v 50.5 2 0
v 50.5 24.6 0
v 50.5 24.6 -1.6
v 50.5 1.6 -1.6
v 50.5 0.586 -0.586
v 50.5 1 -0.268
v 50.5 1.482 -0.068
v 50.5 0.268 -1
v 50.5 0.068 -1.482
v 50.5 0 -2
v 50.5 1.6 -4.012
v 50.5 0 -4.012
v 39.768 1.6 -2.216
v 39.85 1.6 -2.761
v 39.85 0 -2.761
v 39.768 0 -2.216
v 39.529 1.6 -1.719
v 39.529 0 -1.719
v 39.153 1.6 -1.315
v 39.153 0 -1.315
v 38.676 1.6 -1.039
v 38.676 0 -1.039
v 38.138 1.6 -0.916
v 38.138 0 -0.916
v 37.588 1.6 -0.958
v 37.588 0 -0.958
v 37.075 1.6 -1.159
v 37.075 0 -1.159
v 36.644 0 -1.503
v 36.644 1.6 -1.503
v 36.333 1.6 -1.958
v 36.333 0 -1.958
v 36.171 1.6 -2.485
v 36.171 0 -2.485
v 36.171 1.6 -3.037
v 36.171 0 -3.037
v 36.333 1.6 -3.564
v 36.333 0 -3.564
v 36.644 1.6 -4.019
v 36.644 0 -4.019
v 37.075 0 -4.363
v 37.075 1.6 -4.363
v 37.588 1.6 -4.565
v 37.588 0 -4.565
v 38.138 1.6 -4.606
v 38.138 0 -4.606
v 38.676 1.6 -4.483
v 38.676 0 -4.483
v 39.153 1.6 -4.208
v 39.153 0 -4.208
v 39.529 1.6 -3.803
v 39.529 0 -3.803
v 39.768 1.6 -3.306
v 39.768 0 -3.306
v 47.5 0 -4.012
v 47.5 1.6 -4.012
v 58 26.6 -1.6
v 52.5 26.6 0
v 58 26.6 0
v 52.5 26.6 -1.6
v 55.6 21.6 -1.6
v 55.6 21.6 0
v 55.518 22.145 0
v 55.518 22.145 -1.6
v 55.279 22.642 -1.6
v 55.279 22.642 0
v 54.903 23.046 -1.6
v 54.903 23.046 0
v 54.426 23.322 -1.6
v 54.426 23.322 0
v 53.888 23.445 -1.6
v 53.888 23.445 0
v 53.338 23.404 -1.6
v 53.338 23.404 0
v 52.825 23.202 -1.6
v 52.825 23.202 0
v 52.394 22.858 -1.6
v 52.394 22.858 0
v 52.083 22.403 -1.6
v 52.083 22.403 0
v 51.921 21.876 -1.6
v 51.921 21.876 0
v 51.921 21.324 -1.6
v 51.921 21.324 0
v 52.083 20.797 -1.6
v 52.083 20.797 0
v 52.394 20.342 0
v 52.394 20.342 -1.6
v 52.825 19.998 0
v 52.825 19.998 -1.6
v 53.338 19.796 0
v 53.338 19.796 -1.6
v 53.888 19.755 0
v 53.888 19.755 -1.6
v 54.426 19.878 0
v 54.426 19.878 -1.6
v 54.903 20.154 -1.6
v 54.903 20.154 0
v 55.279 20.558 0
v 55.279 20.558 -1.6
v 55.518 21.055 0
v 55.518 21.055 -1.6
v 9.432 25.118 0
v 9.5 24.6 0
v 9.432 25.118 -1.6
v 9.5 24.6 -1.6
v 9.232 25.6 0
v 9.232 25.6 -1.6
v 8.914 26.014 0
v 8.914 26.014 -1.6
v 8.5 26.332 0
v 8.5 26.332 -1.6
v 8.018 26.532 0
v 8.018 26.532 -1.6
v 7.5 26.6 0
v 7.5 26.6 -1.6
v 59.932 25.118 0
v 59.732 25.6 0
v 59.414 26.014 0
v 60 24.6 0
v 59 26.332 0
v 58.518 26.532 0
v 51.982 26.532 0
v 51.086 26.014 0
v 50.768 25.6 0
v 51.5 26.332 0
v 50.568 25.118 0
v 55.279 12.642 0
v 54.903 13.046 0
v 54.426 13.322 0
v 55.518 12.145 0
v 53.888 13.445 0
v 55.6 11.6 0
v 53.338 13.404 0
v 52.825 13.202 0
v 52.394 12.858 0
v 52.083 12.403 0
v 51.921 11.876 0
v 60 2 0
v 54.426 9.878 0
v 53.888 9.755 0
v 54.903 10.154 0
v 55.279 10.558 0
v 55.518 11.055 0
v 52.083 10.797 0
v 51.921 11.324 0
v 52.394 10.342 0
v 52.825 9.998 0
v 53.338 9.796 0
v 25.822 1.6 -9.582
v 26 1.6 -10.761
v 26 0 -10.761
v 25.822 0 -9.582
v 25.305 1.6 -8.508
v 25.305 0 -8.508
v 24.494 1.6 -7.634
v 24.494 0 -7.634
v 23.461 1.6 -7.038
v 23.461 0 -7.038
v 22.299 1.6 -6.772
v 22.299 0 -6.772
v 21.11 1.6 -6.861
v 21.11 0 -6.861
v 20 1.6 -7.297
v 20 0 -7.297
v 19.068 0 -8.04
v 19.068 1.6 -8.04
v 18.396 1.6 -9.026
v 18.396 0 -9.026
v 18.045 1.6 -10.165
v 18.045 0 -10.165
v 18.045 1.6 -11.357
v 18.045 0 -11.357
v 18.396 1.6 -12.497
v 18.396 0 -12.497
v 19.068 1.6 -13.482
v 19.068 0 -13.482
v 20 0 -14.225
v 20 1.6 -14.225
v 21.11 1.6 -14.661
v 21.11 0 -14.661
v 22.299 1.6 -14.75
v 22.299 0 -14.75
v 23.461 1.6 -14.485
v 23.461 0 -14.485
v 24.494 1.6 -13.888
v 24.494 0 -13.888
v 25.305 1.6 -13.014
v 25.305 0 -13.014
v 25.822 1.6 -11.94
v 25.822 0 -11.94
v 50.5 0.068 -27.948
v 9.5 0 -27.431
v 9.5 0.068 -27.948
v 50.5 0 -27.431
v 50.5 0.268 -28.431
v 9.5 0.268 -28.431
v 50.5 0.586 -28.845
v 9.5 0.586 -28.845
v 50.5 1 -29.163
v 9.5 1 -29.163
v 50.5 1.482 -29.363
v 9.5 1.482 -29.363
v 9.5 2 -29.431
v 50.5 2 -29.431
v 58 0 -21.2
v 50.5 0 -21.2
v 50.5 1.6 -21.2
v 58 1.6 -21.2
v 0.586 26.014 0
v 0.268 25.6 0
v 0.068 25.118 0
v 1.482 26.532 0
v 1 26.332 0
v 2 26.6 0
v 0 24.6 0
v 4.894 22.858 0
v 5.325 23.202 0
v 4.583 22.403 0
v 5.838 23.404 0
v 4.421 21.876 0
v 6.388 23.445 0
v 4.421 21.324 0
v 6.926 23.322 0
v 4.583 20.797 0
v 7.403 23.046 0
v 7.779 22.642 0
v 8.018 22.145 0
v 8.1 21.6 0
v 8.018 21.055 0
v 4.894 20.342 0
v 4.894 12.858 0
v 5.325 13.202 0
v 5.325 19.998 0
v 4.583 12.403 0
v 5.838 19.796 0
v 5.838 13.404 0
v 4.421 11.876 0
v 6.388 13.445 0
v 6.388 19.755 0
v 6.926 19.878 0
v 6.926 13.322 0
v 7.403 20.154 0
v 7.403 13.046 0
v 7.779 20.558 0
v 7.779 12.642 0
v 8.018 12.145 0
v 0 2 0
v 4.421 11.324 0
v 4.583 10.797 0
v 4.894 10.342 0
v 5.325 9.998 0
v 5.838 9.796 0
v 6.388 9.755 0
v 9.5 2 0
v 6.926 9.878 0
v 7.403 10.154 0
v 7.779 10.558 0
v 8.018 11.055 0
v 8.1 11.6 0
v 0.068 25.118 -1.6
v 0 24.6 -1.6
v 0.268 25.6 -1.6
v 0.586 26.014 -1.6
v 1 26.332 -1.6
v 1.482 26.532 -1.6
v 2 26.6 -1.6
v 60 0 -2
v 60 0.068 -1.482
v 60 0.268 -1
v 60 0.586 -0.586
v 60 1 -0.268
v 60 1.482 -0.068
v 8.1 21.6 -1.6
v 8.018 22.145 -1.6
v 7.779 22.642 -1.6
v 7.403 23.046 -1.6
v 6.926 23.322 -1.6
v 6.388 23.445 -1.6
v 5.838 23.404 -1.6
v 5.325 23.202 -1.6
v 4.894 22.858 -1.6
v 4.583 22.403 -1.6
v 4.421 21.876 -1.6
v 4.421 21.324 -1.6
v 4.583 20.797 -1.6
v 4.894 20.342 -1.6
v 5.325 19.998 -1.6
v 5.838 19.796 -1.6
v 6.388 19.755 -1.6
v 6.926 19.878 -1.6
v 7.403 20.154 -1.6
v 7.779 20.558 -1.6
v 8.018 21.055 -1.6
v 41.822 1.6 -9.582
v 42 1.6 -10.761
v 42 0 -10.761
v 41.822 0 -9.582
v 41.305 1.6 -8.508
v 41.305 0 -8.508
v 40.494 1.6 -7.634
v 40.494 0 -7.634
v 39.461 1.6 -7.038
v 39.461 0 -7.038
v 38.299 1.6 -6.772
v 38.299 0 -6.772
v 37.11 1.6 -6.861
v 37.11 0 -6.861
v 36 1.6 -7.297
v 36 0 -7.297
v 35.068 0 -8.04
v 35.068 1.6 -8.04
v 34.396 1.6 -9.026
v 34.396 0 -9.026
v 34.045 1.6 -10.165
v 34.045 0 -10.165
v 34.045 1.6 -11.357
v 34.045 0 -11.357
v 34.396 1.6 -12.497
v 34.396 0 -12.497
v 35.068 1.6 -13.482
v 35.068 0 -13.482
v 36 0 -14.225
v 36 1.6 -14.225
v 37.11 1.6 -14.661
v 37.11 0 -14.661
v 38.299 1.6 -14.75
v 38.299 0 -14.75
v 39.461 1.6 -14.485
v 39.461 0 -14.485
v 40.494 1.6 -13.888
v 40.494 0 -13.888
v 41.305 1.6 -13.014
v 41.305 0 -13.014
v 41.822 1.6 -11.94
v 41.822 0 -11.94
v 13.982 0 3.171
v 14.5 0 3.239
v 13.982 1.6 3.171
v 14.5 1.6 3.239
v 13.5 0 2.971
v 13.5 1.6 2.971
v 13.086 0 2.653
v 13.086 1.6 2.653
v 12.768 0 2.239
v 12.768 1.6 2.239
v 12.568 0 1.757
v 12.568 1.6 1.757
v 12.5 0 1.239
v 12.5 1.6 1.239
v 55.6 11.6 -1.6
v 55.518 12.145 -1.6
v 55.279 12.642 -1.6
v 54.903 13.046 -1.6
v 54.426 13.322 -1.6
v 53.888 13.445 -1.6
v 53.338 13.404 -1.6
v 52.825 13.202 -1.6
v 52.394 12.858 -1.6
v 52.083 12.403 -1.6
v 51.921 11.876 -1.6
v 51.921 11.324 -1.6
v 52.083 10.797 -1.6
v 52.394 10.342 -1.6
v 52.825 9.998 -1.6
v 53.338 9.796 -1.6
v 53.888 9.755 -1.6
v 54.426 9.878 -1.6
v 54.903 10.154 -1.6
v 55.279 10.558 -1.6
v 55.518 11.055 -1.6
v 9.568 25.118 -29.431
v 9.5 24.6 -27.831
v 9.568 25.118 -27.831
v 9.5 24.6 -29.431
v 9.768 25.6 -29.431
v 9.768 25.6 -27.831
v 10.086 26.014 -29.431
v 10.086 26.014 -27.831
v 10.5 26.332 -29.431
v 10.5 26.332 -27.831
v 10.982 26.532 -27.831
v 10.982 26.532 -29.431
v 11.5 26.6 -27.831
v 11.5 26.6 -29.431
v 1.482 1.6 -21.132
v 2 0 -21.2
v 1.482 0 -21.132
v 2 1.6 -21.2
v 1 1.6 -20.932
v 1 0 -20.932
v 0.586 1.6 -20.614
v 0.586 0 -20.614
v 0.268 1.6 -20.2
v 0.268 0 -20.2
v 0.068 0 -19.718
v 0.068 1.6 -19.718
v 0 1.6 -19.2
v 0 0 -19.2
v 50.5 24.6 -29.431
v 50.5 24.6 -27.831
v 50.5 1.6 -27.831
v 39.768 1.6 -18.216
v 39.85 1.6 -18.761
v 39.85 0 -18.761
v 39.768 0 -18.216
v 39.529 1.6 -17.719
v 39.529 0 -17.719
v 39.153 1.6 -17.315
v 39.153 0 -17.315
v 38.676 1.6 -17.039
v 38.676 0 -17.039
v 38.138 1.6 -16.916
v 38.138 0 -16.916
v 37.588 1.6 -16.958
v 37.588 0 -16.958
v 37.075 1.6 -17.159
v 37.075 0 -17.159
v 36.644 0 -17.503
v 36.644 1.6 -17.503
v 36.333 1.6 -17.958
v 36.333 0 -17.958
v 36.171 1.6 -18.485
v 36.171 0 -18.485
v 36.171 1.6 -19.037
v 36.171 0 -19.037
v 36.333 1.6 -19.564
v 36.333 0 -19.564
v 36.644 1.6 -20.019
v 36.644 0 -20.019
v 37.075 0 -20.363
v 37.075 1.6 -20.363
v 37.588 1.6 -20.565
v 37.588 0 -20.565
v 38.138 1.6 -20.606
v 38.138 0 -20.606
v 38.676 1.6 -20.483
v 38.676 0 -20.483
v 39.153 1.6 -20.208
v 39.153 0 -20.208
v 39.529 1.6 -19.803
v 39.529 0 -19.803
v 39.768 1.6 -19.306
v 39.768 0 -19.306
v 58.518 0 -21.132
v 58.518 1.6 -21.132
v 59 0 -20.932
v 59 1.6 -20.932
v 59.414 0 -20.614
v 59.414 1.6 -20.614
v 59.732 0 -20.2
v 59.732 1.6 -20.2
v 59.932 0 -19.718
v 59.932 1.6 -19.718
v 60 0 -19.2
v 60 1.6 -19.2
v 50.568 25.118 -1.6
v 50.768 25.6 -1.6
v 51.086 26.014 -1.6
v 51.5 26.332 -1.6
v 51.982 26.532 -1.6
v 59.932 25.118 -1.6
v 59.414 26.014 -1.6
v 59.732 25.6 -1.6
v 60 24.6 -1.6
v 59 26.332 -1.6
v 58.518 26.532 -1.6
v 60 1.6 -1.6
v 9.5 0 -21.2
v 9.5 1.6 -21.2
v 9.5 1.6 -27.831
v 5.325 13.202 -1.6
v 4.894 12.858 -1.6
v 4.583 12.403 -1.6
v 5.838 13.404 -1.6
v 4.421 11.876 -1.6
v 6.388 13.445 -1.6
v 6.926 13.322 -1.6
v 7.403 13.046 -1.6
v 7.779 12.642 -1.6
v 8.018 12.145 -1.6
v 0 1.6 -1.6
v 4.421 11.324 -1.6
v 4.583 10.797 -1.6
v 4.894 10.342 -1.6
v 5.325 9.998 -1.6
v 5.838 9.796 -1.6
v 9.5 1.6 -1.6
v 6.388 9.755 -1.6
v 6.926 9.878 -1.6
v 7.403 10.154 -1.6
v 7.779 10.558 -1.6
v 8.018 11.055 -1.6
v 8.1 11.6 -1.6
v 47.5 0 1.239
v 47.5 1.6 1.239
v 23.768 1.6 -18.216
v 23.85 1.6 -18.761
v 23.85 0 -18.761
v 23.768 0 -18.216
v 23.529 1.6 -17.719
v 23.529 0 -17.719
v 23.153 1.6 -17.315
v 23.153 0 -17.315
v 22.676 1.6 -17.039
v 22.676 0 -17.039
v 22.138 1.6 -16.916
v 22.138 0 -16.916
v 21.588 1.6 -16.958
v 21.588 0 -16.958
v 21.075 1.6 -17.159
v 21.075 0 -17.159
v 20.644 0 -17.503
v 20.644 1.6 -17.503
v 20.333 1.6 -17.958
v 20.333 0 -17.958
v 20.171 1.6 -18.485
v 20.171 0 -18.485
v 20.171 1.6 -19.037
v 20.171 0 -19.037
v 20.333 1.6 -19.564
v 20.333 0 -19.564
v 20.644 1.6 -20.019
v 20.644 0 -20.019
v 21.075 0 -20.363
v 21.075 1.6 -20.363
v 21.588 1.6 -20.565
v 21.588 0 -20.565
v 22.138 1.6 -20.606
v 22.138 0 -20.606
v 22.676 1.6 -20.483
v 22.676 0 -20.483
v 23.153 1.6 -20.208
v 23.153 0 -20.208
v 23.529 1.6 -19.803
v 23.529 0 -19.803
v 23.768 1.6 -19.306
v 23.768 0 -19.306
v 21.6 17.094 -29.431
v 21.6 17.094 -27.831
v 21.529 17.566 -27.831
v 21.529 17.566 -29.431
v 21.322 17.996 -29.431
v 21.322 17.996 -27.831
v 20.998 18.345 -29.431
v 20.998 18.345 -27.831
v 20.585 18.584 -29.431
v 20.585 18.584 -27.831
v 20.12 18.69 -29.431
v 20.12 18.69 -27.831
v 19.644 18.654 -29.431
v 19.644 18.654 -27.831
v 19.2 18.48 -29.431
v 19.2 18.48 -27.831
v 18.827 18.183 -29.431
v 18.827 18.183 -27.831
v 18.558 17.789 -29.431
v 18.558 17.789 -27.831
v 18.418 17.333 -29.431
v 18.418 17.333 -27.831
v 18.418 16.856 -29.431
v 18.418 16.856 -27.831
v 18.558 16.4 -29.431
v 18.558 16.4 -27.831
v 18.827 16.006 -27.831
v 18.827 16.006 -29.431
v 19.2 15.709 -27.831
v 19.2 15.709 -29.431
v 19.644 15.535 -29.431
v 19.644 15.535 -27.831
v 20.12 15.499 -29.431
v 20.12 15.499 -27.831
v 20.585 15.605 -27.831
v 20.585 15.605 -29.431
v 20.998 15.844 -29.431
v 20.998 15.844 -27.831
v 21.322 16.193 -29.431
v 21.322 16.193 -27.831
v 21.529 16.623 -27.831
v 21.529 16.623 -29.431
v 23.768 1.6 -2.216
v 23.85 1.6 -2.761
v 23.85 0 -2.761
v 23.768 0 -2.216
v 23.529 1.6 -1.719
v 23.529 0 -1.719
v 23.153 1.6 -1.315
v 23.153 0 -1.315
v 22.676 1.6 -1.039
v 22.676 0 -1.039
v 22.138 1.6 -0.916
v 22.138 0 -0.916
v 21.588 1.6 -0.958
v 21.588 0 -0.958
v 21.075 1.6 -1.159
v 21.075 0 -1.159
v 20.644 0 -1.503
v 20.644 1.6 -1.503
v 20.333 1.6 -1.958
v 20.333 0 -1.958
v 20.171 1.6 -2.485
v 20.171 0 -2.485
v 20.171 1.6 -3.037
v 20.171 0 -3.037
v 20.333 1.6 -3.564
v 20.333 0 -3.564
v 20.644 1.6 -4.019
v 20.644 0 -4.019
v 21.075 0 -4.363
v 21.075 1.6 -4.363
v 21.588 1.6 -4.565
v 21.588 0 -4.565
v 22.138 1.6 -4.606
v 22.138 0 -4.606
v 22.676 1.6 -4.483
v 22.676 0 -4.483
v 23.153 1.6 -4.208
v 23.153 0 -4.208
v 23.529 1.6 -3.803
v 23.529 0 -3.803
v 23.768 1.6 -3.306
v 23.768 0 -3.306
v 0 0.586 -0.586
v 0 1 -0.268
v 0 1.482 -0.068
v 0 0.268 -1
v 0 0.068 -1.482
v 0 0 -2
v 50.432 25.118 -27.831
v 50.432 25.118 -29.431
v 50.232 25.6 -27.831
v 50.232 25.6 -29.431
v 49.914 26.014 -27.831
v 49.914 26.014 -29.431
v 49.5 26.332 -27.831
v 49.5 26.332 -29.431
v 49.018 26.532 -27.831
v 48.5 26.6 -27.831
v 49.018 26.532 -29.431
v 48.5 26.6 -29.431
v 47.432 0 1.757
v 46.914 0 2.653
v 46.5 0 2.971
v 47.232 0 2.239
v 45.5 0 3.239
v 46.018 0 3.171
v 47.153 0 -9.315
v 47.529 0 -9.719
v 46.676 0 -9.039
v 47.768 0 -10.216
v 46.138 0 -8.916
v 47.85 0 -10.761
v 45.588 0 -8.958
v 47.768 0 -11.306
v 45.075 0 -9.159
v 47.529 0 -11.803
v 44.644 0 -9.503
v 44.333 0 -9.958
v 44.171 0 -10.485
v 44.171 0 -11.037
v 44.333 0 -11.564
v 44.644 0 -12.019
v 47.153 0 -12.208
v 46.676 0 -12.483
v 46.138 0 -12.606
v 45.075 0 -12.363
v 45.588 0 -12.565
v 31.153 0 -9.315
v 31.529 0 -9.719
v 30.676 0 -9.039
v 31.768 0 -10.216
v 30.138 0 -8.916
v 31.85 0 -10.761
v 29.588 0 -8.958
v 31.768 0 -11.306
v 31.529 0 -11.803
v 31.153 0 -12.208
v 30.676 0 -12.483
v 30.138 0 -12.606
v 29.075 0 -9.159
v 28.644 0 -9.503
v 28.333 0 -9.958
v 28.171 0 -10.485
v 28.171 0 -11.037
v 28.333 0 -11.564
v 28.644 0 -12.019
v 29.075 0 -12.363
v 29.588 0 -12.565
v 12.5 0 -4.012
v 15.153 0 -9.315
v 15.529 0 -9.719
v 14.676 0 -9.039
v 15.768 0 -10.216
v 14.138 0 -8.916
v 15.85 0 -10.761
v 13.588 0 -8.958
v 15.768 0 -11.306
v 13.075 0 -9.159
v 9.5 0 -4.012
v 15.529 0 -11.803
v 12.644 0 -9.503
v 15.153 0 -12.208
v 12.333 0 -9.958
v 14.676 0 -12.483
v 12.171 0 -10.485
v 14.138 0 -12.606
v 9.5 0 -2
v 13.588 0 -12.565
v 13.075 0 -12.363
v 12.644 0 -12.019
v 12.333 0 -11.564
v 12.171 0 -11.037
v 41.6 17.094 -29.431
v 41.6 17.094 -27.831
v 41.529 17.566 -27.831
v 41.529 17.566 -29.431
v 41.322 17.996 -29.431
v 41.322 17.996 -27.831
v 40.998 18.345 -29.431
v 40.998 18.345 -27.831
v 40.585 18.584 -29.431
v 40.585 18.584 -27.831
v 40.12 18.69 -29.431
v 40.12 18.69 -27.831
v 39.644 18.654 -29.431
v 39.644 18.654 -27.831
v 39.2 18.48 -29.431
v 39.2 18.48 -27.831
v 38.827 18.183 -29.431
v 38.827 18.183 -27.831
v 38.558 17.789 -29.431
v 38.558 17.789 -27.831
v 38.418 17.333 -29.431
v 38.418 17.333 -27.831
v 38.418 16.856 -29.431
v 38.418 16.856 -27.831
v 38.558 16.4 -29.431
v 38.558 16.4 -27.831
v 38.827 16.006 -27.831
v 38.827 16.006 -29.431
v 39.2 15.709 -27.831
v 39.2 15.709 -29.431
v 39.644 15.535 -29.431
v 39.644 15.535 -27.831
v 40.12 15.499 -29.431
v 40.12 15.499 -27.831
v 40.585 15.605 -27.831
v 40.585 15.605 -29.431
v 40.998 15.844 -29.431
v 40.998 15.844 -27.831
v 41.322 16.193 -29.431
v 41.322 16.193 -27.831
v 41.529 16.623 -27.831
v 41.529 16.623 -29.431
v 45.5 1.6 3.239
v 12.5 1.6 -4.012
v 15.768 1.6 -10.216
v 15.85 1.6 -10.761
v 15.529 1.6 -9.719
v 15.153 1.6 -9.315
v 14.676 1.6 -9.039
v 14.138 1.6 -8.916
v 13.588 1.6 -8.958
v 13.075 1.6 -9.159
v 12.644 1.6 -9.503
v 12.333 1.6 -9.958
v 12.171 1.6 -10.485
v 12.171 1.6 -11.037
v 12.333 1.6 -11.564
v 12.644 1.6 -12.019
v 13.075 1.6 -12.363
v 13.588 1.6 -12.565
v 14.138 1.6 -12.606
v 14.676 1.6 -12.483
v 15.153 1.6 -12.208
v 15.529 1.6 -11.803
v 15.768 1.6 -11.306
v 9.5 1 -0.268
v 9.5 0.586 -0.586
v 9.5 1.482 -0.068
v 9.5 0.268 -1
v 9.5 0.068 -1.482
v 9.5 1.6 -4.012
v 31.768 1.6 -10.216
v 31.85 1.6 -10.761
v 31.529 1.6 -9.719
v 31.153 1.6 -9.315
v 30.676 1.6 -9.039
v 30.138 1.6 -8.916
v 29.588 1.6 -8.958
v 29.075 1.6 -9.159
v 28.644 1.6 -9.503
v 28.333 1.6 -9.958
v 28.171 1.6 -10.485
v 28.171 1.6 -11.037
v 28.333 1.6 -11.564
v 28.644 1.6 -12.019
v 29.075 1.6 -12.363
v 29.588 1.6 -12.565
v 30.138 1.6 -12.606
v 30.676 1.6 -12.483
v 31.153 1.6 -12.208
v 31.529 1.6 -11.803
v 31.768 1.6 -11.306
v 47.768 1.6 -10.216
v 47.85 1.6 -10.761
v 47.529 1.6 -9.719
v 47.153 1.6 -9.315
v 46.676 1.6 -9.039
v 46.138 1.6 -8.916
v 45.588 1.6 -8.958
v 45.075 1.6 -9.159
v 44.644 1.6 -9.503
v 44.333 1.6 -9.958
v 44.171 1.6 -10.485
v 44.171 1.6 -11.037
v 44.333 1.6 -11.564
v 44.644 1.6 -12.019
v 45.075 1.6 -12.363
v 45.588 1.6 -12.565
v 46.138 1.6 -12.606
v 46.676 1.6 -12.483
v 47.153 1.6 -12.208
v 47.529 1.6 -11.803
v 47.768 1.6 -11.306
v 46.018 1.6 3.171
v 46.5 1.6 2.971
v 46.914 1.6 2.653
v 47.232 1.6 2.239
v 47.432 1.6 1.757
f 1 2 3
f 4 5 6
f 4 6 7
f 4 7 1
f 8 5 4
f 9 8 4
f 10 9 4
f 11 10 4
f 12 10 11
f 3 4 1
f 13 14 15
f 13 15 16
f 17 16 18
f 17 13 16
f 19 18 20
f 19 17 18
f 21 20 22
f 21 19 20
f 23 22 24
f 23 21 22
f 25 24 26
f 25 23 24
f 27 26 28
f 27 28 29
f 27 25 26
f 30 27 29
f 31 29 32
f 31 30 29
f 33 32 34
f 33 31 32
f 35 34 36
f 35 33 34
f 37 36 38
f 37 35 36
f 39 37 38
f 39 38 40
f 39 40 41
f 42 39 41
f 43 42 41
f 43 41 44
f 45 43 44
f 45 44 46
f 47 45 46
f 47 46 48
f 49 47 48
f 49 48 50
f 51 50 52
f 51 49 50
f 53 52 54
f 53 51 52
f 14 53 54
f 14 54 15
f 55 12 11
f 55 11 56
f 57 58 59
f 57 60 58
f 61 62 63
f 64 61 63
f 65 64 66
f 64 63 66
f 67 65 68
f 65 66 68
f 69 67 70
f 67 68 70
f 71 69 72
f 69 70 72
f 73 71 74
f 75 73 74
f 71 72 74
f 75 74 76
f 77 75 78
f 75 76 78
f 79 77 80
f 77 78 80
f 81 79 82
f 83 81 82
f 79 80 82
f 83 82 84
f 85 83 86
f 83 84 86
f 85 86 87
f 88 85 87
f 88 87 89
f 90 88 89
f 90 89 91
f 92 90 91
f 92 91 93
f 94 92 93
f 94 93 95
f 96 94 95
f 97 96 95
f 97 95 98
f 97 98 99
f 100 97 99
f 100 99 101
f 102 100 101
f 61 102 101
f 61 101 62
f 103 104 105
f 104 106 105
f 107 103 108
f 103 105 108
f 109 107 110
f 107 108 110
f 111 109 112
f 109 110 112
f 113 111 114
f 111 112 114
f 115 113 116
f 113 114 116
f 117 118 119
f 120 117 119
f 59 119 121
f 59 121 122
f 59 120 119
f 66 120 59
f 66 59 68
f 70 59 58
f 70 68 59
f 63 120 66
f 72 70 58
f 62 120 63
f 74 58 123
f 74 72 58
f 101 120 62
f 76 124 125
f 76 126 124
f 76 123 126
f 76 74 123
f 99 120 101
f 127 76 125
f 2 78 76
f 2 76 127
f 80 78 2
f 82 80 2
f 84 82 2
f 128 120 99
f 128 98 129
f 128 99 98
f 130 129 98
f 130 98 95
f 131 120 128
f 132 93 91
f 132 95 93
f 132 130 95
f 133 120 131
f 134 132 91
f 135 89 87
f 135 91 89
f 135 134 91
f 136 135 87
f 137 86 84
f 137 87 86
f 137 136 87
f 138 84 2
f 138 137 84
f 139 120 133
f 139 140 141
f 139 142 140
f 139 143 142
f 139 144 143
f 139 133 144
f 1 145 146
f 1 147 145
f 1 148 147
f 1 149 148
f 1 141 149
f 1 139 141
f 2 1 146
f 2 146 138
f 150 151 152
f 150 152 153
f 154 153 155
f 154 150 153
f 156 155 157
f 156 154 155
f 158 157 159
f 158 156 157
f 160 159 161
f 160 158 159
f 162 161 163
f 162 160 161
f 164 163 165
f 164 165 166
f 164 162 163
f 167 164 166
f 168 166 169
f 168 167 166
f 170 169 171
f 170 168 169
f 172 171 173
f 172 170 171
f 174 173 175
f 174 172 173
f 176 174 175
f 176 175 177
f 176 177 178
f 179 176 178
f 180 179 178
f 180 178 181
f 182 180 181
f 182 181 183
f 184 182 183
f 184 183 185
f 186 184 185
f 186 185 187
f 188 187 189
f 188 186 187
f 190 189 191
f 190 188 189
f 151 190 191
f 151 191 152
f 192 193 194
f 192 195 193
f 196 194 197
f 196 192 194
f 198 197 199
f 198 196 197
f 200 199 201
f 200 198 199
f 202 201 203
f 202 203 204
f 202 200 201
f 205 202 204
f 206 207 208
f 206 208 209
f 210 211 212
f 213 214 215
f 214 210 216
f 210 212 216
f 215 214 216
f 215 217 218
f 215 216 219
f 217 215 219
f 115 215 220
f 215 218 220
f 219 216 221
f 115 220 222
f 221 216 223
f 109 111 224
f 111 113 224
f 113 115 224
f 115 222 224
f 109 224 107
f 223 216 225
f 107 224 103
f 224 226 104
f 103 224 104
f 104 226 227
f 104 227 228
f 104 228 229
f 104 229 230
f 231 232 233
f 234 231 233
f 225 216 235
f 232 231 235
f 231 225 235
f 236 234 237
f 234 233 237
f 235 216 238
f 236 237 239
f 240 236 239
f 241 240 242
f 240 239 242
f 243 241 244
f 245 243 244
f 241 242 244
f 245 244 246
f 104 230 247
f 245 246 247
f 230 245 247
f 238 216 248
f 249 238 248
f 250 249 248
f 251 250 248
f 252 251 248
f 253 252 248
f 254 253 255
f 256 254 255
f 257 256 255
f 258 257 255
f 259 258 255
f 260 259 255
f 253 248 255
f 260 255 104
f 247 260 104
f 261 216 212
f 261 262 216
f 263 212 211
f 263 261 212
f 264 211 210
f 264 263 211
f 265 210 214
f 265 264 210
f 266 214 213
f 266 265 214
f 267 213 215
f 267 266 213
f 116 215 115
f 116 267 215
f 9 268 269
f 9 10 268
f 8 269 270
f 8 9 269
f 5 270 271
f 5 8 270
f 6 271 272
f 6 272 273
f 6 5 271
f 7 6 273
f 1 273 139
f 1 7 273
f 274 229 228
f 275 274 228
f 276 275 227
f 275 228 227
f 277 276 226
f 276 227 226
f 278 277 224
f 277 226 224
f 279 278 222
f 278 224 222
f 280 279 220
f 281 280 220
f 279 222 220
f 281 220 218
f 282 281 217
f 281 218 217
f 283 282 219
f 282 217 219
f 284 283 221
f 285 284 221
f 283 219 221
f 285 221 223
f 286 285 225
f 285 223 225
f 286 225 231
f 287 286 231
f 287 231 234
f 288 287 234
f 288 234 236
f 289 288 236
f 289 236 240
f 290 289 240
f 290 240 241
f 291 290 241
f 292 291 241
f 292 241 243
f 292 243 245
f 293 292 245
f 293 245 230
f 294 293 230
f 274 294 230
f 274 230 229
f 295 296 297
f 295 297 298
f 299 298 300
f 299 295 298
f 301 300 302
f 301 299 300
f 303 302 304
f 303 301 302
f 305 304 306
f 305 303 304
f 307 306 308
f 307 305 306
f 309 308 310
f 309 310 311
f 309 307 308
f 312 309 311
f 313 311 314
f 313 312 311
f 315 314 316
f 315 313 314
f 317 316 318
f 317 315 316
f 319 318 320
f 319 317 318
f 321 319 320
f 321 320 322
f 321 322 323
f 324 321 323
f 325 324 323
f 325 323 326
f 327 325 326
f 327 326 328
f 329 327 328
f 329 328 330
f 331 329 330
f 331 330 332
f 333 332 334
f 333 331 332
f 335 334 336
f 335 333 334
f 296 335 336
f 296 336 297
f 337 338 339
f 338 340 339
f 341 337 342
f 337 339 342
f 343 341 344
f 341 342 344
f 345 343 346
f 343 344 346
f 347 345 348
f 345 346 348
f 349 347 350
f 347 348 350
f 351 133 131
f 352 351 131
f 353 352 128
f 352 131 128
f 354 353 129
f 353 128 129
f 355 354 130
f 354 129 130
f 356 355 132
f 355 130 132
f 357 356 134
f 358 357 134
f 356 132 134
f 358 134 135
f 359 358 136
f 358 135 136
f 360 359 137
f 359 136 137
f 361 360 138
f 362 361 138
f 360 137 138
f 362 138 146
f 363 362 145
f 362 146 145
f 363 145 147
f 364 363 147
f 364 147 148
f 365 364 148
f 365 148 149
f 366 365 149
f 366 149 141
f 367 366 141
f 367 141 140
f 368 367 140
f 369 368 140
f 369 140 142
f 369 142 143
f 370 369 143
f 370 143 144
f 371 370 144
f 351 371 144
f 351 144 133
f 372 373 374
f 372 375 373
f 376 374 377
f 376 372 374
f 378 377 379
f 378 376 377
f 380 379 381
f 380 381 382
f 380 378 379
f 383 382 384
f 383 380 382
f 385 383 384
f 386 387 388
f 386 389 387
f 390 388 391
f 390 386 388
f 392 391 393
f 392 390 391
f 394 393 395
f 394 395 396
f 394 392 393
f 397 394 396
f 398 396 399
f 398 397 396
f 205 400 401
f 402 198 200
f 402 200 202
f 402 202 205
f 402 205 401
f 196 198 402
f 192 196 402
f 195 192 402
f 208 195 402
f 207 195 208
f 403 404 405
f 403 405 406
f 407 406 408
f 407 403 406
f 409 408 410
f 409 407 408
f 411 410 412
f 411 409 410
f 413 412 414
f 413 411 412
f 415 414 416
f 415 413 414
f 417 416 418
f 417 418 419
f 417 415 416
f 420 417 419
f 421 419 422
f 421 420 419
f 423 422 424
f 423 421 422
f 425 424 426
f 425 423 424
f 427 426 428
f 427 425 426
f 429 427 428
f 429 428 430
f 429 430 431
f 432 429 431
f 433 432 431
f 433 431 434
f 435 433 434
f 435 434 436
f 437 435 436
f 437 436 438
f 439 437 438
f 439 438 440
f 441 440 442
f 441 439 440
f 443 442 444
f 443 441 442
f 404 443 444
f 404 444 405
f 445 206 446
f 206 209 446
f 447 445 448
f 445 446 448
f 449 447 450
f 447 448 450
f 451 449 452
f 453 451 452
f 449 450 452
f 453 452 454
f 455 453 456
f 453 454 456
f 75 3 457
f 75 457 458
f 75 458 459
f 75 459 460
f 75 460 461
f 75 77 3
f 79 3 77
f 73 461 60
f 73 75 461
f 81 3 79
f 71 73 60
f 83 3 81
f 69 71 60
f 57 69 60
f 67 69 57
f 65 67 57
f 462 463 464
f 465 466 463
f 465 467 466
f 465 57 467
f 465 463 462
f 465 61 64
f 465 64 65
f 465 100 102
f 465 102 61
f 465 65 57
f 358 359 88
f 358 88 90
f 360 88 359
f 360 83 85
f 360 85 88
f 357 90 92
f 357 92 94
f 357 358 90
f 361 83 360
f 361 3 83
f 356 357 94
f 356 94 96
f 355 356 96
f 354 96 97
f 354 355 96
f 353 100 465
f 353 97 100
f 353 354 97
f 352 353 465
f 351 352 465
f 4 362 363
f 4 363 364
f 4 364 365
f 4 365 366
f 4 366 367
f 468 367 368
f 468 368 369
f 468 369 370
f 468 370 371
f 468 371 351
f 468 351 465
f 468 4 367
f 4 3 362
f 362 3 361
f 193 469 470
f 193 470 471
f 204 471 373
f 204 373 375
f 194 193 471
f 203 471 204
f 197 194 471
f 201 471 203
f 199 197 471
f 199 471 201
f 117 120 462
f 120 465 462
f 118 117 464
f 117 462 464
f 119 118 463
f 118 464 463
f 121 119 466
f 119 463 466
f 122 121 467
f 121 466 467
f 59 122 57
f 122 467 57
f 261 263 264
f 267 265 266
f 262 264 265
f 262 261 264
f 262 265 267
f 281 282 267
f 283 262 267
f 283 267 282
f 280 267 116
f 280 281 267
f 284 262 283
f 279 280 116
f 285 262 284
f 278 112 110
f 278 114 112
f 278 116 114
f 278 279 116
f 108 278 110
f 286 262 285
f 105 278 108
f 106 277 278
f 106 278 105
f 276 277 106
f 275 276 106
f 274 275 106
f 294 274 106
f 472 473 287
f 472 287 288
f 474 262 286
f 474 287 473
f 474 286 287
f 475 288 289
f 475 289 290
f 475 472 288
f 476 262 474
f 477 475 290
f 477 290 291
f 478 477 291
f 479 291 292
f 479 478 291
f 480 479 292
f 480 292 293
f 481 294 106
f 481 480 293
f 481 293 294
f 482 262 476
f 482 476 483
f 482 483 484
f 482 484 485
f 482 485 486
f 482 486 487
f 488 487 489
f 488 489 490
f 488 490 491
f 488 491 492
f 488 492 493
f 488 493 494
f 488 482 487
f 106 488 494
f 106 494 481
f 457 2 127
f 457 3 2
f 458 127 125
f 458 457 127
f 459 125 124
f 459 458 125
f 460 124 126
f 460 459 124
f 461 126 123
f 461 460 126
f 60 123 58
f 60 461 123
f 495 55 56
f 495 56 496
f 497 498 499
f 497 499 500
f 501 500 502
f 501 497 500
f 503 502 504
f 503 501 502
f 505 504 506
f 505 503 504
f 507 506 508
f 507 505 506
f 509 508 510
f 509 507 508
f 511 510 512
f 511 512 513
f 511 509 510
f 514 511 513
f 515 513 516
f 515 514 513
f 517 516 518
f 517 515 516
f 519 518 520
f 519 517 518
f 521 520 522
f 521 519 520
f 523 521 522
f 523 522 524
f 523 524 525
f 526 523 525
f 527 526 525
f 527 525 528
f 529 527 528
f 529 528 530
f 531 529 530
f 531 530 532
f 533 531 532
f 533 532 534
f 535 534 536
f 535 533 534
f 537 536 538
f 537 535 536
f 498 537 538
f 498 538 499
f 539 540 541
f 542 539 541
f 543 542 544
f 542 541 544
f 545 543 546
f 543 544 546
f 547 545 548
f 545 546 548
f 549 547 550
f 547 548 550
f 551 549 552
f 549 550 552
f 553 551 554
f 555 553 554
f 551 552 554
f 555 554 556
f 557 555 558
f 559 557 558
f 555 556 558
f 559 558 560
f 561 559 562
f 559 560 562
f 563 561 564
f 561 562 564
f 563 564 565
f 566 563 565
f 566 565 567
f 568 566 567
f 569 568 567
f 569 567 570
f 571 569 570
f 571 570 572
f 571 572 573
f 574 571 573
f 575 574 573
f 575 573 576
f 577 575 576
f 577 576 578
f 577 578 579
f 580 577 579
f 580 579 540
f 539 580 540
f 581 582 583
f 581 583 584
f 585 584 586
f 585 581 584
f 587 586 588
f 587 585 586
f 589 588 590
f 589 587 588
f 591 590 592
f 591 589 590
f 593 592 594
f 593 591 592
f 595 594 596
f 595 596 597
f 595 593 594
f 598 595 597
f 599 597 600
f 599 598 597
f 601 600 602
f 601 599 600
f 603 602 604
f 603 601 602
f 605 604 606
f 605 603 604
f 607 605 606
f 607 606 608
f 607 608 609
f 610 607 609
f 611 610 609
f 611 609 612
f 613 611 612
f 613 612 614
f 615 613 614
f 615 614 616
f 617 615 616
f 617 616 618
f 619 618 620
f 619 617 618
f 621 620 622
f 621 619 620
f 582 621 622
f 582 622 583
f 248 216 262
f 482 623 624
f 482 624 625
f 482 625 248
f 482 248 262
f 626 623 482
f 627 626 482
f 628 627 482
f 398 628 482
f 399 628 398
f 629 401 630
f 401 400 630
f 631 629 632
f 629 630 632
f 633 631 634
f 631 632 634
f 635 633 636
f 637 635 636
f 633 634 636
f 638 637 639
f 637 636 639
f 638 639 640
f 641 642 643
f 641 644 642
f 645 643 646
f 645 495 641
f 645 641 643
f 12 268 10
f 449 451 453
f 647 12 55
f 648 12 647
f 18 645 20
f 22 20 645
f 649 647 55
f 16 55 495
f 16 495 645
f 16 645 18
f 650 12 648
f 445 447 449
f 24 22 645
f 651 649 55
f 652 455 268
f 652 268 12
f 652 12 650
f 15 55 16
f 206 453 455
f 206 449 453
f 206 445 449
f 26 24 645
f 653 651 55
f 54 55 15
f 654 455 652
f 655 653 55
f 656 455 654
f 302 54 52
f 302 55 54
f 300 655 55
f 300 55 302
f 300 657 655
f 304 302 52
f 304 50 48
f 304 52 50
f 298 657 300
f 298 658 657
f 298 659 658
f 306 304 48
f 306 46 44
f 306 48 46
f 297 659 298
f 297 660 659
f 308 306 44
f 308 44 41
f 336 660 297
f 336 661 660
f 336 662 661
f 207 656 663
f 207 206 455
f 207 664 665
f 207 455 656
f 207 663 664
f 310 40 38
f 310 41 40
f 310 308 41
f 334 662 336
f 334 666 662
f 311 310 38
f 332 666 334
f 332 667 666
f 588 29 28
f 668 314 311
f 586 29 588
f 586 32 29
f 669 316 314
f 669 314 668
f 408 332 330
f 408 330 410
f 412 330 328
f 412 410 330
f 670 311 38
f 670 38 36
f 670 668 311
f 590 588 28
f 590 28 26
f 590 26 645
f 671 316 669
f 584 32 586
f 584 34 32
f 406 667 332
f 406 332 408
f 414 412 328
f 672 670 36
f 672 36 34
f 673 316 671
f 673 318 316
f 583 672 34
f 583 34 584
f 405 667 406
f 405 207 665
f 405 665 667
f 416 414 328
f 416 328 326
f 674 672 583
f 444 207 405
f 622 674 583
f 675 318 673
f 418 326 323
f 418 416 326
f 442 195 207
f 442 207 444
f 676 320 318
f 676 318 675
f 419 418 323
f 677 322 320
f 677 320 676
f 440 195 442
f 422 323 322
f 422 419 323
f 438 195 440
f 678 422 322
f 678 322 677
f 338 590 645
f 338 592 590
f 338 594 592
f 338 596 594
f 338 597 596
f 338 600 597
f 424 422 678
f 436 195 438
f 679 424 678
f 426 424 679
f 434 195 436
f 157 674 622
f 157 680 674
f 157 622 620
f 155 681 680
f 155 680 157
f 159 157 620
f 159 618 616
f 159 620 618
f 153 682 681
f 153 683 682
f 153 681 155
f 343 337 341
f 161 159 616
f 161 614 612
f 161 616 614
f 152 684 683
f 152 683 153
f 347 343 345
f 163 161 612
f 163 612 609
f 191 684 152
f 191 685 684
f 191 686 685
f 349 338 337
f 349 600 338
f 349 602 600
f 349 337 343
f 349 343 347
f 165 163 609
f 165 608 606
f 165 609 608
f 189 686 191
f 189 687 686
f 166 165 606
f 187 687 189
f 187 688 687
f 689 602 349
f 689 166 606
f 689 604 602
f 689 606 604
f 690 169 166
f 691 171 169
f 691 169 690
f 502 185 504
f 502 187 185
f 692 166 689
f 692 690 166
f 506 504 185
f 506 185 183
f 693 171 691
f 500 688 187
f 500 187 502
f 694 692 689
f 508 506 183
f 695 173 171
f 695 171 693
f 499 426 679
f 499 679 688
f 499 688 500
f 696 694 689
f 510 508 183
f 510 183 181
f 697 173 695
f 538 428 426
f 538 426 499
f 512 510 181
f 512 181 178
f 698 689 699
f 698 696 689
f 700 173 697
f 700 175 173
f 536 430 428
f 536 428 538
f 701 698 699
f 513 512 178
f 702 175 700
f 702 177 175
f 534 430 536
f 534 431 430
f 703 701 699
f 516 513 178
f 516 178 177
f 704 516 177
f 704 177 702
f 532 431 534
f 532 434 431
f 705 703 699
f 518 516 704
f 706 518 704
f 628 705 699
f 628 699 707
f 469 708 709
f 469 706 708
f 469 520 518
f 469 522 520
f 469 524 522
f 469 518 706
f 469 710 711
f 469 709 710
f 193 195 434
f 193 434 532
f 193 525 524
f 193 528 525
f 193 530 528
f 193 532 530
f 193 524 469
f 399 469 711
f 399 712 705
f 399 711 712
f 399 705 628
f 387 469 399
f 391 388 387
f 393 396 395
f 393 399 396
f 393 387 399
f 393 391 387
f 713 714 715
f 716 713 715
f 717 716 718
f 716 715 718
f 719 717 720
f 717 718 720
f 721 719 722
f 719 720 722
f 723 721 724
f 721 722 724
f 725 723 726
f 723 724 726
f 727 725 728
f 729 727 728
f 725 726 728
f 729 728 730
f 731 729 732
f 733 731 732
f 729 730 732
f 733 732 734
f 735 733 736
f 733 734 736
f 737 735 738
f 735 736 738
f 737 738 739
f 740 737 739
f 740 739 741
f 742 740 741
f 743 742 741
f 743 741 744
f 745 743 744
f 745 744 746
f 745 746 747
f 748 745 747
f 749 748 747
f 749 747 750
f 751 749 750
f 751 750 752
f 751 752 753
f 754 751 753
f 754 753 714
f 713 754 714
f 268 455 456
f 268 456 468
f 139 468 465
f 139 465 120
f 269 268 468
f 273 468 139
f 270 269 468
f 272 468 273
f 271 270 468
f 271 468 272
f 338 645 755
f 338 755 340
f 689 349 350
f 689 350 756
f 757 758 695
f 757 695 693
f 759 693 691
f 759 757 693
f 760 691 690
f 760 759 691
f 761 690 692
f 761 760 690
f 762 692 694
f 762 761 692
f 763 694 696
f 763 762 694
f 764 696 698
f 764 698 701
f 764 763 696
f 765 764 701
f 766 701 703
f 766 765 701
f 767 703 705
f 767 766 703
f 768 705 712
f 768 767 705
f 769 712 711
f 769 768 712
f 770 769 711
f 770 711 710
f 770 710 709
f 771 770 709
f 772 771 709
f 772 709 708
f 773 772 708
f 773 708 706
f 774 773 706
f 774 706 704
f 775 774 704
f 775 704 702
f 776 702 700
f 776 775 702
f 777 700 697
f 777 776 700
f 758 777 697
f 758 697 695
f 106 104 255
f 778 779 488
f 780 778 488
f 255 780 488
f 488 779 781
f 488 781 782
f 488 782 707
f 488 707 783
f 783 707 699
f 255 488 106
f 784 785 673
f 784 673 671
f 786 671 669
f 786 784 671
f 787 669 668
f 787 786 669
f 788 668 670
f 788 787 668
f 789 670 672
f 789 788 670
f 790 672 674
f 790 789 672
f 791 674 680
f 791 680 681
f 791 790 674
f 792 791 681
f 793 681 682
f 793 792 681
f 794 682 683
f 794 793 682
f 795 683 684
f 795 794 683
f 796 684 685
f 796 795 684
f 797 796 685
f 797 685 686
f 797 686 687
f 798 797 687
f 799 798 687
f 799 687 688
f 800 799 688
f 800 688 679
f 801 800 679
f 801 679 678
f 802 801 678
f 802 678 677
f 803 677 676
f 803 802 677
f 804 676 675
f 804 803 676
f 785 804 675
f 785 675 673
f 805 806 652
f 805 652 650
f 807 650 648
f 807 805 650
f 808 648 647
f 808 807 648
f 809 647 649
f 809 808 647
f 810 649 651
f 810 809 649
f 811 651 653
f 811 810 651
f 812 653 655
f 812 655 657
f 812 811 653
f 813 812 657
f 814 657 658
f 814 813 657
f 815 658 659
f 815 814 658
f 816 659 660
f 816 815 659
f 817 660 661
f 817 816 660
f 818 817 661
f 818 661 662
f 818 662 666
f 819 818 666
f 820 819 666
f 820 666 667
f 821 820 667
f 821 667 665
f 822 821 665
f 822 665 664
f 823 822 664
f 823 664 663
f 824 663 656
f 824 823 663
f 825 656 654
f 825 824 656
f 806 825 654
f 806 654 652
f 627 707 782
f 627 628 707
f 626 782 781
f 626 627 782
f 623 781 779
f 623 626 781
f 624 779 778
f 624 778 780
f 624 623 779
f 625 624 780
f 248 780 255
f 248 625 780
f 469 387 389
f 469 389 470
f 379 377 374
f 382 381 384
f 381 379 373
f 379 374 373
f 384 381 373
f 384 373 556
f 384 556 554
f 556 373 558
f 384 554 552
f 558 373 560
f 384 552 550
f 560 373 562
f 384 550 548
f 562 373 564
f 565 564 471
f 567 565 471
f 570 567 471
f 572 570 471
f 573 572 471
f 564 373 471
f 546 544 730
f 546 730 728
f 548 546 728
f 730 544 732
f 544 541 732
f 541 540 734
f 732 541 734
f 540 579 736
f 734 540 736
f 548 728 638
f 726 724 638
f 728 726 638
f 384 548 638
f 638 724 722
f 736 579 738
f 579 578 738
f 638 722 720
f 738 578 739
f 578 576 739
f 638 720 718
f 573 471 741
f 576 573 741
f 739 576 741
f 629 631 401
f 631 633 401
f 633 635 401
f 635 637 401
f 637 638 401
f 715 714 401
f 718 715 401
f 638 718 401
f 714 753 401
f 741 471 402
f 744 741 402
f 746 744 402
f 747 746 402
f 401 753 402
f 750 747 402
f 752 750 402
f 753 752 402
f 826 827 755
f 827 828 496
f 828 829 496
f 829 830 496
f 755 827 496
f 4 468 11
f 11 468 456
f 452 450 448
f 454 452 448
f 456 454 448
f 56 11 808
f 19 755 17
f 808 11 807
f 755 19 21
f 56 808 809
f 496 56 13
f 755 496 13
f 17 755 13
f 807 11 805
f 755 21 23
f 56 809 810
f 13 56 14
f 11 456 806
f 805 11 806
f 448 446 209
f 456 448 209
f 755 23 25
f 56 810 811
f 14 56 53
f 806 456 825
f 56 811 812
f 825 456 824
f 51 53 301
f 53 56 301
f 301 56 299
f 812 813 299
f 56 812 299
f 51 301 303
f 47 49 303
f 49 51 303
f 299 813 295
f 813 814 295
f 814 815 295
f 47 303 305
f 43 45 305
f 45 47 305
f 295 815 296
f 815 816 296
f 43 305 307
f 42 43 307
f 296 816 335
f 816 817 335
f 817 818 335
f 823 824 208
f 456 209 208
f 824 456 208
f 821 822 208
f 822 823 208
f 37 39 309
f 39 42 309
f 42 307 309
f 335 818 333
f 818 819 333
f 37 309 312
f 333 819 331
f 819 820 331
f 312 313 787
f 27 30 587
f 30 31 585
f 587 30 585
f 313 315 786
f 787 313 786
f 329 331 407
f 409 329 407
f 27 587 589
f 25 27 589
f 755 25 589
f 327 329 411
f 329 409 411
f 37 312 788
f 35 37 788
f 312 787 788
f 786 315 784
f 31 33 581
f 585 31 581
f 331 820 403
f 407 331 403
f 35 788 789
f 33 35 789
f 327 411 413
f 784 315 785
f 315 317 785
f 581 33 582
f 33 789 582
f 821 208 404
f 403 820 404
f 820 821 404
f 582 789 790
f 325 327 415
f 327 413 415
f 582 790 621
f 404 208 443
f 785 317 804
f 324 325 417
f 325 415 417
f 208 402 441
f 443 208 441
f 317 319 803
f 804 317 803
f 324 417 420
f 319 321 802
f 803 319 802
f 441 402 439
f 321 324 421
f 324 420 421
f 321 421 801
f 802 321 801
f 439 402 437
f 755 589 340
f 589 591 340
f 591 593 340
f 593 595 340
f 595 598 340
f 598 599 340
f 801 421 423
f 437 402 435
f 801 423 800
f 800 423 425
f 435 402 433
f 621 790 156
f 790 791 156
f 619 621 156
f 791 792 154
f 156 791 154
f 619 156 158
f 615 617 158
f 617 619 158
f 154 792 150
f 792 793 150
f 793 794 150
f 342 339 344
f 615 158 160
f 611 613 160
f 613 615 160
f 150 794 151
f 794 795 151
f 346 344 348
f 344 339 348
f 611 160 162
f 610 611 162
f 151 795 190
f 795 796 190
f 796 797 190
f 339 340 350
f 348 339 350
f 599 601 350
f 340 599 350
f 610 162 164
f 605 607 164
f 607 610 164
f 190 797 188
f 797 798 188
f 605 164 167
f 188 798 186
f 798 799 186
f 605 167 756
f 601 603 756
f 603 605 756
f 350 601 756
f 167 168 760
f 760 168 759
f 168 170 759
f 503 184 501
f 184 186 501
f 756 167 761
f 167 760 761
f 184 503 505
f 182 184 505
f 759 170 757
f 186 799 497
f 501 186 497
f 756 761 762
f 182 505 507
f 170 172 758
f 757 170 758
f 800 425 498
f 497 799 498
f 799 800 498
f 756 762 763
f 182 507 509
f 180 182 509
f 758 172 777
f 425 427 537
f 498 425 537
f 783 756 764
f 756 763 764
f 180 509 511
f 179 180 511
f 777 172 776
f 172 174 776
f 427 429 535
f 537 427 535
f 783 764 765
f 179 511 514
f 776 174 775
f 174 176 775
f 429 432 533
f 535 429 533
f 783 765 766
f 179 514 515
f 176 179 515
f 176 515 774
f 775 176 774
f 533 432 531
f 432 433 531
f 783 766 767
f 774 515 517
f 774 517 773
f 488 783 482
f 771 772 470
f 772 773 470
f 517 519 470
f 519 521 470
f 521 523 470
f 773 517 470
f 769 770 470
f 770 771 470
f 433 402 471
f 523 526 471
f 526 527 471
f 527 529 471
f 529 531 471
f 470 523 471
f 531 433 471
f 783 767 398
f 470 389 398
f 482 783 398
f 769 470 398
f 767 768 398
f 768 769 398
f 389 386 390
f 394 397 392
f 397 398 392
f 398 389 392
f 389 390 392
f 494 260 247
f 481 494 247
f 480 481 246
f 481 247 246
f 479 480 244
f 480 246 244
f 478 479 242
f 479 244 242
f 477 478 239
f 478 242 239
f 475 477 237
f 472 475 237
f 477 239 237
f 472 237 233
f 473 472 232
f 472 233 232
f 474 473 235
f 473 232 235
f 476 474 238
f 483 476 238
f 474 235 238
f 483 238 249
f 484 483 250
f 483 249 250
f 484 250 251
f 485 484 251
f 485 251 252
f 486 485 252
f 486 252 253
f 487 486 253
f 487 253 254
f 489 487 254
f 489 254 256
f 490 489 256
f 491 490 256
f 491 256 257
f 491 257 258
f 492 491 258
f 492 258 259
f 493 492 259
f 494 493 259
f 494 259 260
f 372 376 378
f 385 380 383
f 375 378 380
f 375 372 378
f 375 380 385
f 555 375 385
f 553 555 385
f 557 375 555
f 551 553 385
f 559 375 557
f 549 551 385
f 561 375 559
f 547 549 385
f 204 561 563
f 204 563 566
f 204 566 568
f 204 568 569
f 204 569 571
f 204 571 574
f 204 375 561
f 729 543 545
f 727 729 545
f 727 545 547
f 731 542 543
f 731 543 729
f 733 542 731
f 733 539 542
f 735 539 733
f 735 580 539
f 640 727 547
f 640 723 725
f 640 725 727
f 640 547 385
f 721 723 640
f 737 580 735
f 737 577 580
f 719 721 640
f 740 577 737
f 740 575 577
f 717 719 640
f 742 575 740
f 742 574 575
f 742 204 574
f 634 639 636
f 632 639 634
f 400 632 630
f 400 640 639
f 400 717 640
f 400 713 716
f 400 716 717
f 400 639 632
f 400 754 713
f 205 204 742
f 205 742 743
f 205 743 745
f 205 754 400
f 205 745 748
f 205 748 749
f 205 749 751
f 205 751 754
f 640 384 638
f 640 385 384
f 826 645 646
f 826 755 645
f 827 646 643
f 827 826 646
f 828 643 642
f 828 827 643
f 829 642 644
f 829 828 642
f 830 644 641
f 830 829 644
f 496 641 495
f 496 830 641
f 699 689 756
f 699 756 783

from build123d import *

# Parameters (mm, degrees)
EXTRUDE1_DEPTH           = 1.6
SKETCH2_W                = 9.5
SKETCH2_H                = 1.6
SKETCH2_W_2              = 41
EXTRUDE2_DEPTH           = 25
SKETCH3_R                = 1.85
CUT_EXTRUDE1_DEPTH       = 72.928615584
SKETCH4_R                = 1.6
CUT_EXTRUDE2_DEPTH       = 25
CUT_EXTRUDE3_START       = -1.6
CUT_EXTRUDE3_OUTLINE_R   = 1.85
CUT_EXTRUDE3_OUTLINE_R_2 = 4
CUT_EXTRUDE3_DEPTH       = 1.6
FILLET1_R                = 2
FILLET2_R                = 2
FILLET3_R                = 2
FILLET4_R                = 2
FILLET5_R                = 2
FILLET6_R                = 2
FILLET7_R                = 2
FILLET8_R                = 2
FILLET9_R                = 2
FILLET10_R               = 2
FILLET11_R               = 2
FILLET12_R               = 2
FILLET13_R               = 2


# Read off the part's stored shape, not the designer's step: Cut-Extrude3
with BuildPart() as part:
    # Sketch1 → Extrude1 (new body)
    with BuildSketch(Plane(origin=(0, 0, 0), x_dir=(1, 0, 0), z_dir=(0, 1, 0))):
        Polygon((0, 0), (0, 21.2), (9.5, 21.2), (9.5, 29.43069384), (50.5, 29.43069384), (50.5, 21.2), (60, 21.2), (60, 0), (50.5, 0), (50.5, 4.011974119), (47.5, 4.011974119), (47.5, -3.238875216), (12.5, -3.238875216), (12.5, 4.011974119), (9.5, 4.011974119), (9.5, 0), align=None)
    extrude(amount=EXTRUDE1_DEPTH)

    # Sketch2 → Extrude2 (add)
    with BuildSketch(Plane(origin=(0, 1.6, 0), x_dir=(1, 0, 0), z_dir=(0, 1, 0))):
        with Locations((4.75, 0.8)):
            Rectangle(SKETCH2_W, SKETCH2_H)
        with Locations((55.25, 0.8)):
            Rectangle(SKETCH2_W, SKETCH2_H)
        with Locations((30, 28.63069384)):
            Rectangle(SKETCH2_W_2, SKETCH2_H)
    extrude(amount=EXTRUDE2_DEPTH)

    # Sketch3 → Cut-Extrude1 (cut, through all)
    with BuildSketch(Plane.XY):
        with Locations((6.25, 21.6)):
            Circle(SKETCH3_R)
        with Locations((6.25, 11.6)):
            Circle(SKETCH3_R)
        with Locations((53.75, 21.6)):
            Circle(SKETCH3_R)
        with Locations((53.75, 11.6)):
            Circle(SKETCH3_R)
    extrude(amount=-CUT_EXTRUDE1_DEPTH, mode=Mode.SUBTRACT)

    # Sketch4 → Cut-Extrude2 (cut)
    with BuildSketch(Plane.XY.offset(-27.83069384)):
        with Locations((20, 17.094459231)):
            Circle(SKETCH4_R)
        with Locations((40, 17.094459231)):
            Circle(SKETCH4_R)
    extrude(amount=-CUT_EXTRUDE2_DEPTH, mode=Mode.SUBTRACT)

    # Cut-Extrude3 outline → Cut-Extrude3 (cut)
    with BuildSketch(Plane.XZ.offset(CUT_EXTRUDE3_START)):
        with Locations((14, -10.761124784)):
            Circle(CUT_EXTRUDE3_OUTLINE_R)
        with Locations((22, -10.761124784)):
            Circle(CUT_EXTRUDE3_OUTLINE_R_2)
        with Locations((30, -10.761124784)):
            Circle(CUT_EXTRUDE3_OUTLINE_R)
        with Locations((22, -18.761124784)):
            Circle(CUT_EXTRUDE3_OUTLINE_R)
        with Locations((22, -2.761124784)):
            Circle(CUT_EXTRUDE3_OUTLINE_R)
        with Locations((38, -10.761124784)):
            Circle(CUT_EXTRUDE3_OUTLINE_R_2)
        with Locations((46, -10.761124784)):
            Circle(CUT_EXTRUDE3_OUTLINE_R)
        with Locations((38, -18.761124784)):
            Circle(CUT_EXTRUDE3_OUTLINE_R)
        with Locations((38, -2.761124784)):
            Circle(CUT_EXTRUDE3_OUTLINE_R)
    extrude(amount=CUT_EXTRUDE3_DEPTH, mode=Mode.SUBTRACT)

    # Fillet1
    fillet1_edges = [part.edges().sort_by_distance(p)[0] for p in [
        (47.5, 0.8, 3.238875216),
    ]]
    fillet(fillet1_edges, radius=FILLET1_R)

    # Fillet2
    fillet2_edges = [part.edges().sort_by_distance(p)[0] for p in [
        (12.5, 0.8, 3.238875216),
    ]]
    fillet(fillet2_edges, radius=FILLET2_R)

    # Fillet3
    fillet3_edges = [part.edges().sort_by_distance(p)[0] for p in [
        (60, 26.6, -0.8),
    ]]
    fillet(fillet3_edges, radius=FILLET3_R)

    # Fillet4
    fillet4_edges = [part.edges().sort_by_distance(p)[0] for p in [
        (9.5, 26.6, -0.8),
    ]]
    fillet(fillet4_edges, radius=FILLET4_R)

    # Fillet5
    fillet5_edges = [part.edges().sort_by_distance(p)[0] for p in [
        (50.5, 26.6, -28.63069384),
    ]]
    fillet(fillet5_edges, radius=FILLET5_R)

    # Fillet6
    fillet6_edges = [part.edges().sort_by_distance(p)[0] for p in [
        (50.5, 26.6, -0.8),
    ]]
    fillet(fillet6_edges, radius=FILLET6_R)

    # Fillet7
    fillet7_edges = [part.edges().sort_by_distance(p)[0] for p in [
        (0, 26.6, -0.8),
    ]]
    fillet(fillet7_edges, radius=FILLET7_R)

    # Fillet8
    fillet8_edges = [part.edges().sort_by_distance(p)[0] for p in [
        (9.5, 26.6, -28.63069384),
    ]]
    fillet(fillet8_edges, radius=FILLET8_R)

    # Fillet9
    fillet9_edges = [part.edges().sort_by_distance(p)[0] for p in [
        (0, 0.8, -21.2),
    ]]
    fillet(fillet9_edges, radius=FILLET9_R)

    # Fillet10
    fillet10_edges = [part.edges().sort_by_distance(p)[0] for p in [
        (60, 0.8, -21.2),
    ]]
    fillet(fillet10_edges, radius=FILLET10_R)

    # Fillet11
    fillet11_edges = [part.edges().sort_by_distance(p)[0] for p in [
        (30, 0, -29.43069384),
    ]]
    fillet(fillet11_edges, radius=FILLET11_R)

    # Fillet12
    fillet12_edges = [part.edges().sort_by_distance(p)[0] for p in [
        (55.25, 0, 0),
    ]]
    fillet(fillet12_edges, radius=FILLET12_R)

    # Fillet13
    fillet13_edges = [part.edges().sort_by_distance(p)[0] for p in [
        (4.75, 0, 0),
    ]]
    fillet(fillet13_edges, radius=FILLET13_R)


solid = part.part
